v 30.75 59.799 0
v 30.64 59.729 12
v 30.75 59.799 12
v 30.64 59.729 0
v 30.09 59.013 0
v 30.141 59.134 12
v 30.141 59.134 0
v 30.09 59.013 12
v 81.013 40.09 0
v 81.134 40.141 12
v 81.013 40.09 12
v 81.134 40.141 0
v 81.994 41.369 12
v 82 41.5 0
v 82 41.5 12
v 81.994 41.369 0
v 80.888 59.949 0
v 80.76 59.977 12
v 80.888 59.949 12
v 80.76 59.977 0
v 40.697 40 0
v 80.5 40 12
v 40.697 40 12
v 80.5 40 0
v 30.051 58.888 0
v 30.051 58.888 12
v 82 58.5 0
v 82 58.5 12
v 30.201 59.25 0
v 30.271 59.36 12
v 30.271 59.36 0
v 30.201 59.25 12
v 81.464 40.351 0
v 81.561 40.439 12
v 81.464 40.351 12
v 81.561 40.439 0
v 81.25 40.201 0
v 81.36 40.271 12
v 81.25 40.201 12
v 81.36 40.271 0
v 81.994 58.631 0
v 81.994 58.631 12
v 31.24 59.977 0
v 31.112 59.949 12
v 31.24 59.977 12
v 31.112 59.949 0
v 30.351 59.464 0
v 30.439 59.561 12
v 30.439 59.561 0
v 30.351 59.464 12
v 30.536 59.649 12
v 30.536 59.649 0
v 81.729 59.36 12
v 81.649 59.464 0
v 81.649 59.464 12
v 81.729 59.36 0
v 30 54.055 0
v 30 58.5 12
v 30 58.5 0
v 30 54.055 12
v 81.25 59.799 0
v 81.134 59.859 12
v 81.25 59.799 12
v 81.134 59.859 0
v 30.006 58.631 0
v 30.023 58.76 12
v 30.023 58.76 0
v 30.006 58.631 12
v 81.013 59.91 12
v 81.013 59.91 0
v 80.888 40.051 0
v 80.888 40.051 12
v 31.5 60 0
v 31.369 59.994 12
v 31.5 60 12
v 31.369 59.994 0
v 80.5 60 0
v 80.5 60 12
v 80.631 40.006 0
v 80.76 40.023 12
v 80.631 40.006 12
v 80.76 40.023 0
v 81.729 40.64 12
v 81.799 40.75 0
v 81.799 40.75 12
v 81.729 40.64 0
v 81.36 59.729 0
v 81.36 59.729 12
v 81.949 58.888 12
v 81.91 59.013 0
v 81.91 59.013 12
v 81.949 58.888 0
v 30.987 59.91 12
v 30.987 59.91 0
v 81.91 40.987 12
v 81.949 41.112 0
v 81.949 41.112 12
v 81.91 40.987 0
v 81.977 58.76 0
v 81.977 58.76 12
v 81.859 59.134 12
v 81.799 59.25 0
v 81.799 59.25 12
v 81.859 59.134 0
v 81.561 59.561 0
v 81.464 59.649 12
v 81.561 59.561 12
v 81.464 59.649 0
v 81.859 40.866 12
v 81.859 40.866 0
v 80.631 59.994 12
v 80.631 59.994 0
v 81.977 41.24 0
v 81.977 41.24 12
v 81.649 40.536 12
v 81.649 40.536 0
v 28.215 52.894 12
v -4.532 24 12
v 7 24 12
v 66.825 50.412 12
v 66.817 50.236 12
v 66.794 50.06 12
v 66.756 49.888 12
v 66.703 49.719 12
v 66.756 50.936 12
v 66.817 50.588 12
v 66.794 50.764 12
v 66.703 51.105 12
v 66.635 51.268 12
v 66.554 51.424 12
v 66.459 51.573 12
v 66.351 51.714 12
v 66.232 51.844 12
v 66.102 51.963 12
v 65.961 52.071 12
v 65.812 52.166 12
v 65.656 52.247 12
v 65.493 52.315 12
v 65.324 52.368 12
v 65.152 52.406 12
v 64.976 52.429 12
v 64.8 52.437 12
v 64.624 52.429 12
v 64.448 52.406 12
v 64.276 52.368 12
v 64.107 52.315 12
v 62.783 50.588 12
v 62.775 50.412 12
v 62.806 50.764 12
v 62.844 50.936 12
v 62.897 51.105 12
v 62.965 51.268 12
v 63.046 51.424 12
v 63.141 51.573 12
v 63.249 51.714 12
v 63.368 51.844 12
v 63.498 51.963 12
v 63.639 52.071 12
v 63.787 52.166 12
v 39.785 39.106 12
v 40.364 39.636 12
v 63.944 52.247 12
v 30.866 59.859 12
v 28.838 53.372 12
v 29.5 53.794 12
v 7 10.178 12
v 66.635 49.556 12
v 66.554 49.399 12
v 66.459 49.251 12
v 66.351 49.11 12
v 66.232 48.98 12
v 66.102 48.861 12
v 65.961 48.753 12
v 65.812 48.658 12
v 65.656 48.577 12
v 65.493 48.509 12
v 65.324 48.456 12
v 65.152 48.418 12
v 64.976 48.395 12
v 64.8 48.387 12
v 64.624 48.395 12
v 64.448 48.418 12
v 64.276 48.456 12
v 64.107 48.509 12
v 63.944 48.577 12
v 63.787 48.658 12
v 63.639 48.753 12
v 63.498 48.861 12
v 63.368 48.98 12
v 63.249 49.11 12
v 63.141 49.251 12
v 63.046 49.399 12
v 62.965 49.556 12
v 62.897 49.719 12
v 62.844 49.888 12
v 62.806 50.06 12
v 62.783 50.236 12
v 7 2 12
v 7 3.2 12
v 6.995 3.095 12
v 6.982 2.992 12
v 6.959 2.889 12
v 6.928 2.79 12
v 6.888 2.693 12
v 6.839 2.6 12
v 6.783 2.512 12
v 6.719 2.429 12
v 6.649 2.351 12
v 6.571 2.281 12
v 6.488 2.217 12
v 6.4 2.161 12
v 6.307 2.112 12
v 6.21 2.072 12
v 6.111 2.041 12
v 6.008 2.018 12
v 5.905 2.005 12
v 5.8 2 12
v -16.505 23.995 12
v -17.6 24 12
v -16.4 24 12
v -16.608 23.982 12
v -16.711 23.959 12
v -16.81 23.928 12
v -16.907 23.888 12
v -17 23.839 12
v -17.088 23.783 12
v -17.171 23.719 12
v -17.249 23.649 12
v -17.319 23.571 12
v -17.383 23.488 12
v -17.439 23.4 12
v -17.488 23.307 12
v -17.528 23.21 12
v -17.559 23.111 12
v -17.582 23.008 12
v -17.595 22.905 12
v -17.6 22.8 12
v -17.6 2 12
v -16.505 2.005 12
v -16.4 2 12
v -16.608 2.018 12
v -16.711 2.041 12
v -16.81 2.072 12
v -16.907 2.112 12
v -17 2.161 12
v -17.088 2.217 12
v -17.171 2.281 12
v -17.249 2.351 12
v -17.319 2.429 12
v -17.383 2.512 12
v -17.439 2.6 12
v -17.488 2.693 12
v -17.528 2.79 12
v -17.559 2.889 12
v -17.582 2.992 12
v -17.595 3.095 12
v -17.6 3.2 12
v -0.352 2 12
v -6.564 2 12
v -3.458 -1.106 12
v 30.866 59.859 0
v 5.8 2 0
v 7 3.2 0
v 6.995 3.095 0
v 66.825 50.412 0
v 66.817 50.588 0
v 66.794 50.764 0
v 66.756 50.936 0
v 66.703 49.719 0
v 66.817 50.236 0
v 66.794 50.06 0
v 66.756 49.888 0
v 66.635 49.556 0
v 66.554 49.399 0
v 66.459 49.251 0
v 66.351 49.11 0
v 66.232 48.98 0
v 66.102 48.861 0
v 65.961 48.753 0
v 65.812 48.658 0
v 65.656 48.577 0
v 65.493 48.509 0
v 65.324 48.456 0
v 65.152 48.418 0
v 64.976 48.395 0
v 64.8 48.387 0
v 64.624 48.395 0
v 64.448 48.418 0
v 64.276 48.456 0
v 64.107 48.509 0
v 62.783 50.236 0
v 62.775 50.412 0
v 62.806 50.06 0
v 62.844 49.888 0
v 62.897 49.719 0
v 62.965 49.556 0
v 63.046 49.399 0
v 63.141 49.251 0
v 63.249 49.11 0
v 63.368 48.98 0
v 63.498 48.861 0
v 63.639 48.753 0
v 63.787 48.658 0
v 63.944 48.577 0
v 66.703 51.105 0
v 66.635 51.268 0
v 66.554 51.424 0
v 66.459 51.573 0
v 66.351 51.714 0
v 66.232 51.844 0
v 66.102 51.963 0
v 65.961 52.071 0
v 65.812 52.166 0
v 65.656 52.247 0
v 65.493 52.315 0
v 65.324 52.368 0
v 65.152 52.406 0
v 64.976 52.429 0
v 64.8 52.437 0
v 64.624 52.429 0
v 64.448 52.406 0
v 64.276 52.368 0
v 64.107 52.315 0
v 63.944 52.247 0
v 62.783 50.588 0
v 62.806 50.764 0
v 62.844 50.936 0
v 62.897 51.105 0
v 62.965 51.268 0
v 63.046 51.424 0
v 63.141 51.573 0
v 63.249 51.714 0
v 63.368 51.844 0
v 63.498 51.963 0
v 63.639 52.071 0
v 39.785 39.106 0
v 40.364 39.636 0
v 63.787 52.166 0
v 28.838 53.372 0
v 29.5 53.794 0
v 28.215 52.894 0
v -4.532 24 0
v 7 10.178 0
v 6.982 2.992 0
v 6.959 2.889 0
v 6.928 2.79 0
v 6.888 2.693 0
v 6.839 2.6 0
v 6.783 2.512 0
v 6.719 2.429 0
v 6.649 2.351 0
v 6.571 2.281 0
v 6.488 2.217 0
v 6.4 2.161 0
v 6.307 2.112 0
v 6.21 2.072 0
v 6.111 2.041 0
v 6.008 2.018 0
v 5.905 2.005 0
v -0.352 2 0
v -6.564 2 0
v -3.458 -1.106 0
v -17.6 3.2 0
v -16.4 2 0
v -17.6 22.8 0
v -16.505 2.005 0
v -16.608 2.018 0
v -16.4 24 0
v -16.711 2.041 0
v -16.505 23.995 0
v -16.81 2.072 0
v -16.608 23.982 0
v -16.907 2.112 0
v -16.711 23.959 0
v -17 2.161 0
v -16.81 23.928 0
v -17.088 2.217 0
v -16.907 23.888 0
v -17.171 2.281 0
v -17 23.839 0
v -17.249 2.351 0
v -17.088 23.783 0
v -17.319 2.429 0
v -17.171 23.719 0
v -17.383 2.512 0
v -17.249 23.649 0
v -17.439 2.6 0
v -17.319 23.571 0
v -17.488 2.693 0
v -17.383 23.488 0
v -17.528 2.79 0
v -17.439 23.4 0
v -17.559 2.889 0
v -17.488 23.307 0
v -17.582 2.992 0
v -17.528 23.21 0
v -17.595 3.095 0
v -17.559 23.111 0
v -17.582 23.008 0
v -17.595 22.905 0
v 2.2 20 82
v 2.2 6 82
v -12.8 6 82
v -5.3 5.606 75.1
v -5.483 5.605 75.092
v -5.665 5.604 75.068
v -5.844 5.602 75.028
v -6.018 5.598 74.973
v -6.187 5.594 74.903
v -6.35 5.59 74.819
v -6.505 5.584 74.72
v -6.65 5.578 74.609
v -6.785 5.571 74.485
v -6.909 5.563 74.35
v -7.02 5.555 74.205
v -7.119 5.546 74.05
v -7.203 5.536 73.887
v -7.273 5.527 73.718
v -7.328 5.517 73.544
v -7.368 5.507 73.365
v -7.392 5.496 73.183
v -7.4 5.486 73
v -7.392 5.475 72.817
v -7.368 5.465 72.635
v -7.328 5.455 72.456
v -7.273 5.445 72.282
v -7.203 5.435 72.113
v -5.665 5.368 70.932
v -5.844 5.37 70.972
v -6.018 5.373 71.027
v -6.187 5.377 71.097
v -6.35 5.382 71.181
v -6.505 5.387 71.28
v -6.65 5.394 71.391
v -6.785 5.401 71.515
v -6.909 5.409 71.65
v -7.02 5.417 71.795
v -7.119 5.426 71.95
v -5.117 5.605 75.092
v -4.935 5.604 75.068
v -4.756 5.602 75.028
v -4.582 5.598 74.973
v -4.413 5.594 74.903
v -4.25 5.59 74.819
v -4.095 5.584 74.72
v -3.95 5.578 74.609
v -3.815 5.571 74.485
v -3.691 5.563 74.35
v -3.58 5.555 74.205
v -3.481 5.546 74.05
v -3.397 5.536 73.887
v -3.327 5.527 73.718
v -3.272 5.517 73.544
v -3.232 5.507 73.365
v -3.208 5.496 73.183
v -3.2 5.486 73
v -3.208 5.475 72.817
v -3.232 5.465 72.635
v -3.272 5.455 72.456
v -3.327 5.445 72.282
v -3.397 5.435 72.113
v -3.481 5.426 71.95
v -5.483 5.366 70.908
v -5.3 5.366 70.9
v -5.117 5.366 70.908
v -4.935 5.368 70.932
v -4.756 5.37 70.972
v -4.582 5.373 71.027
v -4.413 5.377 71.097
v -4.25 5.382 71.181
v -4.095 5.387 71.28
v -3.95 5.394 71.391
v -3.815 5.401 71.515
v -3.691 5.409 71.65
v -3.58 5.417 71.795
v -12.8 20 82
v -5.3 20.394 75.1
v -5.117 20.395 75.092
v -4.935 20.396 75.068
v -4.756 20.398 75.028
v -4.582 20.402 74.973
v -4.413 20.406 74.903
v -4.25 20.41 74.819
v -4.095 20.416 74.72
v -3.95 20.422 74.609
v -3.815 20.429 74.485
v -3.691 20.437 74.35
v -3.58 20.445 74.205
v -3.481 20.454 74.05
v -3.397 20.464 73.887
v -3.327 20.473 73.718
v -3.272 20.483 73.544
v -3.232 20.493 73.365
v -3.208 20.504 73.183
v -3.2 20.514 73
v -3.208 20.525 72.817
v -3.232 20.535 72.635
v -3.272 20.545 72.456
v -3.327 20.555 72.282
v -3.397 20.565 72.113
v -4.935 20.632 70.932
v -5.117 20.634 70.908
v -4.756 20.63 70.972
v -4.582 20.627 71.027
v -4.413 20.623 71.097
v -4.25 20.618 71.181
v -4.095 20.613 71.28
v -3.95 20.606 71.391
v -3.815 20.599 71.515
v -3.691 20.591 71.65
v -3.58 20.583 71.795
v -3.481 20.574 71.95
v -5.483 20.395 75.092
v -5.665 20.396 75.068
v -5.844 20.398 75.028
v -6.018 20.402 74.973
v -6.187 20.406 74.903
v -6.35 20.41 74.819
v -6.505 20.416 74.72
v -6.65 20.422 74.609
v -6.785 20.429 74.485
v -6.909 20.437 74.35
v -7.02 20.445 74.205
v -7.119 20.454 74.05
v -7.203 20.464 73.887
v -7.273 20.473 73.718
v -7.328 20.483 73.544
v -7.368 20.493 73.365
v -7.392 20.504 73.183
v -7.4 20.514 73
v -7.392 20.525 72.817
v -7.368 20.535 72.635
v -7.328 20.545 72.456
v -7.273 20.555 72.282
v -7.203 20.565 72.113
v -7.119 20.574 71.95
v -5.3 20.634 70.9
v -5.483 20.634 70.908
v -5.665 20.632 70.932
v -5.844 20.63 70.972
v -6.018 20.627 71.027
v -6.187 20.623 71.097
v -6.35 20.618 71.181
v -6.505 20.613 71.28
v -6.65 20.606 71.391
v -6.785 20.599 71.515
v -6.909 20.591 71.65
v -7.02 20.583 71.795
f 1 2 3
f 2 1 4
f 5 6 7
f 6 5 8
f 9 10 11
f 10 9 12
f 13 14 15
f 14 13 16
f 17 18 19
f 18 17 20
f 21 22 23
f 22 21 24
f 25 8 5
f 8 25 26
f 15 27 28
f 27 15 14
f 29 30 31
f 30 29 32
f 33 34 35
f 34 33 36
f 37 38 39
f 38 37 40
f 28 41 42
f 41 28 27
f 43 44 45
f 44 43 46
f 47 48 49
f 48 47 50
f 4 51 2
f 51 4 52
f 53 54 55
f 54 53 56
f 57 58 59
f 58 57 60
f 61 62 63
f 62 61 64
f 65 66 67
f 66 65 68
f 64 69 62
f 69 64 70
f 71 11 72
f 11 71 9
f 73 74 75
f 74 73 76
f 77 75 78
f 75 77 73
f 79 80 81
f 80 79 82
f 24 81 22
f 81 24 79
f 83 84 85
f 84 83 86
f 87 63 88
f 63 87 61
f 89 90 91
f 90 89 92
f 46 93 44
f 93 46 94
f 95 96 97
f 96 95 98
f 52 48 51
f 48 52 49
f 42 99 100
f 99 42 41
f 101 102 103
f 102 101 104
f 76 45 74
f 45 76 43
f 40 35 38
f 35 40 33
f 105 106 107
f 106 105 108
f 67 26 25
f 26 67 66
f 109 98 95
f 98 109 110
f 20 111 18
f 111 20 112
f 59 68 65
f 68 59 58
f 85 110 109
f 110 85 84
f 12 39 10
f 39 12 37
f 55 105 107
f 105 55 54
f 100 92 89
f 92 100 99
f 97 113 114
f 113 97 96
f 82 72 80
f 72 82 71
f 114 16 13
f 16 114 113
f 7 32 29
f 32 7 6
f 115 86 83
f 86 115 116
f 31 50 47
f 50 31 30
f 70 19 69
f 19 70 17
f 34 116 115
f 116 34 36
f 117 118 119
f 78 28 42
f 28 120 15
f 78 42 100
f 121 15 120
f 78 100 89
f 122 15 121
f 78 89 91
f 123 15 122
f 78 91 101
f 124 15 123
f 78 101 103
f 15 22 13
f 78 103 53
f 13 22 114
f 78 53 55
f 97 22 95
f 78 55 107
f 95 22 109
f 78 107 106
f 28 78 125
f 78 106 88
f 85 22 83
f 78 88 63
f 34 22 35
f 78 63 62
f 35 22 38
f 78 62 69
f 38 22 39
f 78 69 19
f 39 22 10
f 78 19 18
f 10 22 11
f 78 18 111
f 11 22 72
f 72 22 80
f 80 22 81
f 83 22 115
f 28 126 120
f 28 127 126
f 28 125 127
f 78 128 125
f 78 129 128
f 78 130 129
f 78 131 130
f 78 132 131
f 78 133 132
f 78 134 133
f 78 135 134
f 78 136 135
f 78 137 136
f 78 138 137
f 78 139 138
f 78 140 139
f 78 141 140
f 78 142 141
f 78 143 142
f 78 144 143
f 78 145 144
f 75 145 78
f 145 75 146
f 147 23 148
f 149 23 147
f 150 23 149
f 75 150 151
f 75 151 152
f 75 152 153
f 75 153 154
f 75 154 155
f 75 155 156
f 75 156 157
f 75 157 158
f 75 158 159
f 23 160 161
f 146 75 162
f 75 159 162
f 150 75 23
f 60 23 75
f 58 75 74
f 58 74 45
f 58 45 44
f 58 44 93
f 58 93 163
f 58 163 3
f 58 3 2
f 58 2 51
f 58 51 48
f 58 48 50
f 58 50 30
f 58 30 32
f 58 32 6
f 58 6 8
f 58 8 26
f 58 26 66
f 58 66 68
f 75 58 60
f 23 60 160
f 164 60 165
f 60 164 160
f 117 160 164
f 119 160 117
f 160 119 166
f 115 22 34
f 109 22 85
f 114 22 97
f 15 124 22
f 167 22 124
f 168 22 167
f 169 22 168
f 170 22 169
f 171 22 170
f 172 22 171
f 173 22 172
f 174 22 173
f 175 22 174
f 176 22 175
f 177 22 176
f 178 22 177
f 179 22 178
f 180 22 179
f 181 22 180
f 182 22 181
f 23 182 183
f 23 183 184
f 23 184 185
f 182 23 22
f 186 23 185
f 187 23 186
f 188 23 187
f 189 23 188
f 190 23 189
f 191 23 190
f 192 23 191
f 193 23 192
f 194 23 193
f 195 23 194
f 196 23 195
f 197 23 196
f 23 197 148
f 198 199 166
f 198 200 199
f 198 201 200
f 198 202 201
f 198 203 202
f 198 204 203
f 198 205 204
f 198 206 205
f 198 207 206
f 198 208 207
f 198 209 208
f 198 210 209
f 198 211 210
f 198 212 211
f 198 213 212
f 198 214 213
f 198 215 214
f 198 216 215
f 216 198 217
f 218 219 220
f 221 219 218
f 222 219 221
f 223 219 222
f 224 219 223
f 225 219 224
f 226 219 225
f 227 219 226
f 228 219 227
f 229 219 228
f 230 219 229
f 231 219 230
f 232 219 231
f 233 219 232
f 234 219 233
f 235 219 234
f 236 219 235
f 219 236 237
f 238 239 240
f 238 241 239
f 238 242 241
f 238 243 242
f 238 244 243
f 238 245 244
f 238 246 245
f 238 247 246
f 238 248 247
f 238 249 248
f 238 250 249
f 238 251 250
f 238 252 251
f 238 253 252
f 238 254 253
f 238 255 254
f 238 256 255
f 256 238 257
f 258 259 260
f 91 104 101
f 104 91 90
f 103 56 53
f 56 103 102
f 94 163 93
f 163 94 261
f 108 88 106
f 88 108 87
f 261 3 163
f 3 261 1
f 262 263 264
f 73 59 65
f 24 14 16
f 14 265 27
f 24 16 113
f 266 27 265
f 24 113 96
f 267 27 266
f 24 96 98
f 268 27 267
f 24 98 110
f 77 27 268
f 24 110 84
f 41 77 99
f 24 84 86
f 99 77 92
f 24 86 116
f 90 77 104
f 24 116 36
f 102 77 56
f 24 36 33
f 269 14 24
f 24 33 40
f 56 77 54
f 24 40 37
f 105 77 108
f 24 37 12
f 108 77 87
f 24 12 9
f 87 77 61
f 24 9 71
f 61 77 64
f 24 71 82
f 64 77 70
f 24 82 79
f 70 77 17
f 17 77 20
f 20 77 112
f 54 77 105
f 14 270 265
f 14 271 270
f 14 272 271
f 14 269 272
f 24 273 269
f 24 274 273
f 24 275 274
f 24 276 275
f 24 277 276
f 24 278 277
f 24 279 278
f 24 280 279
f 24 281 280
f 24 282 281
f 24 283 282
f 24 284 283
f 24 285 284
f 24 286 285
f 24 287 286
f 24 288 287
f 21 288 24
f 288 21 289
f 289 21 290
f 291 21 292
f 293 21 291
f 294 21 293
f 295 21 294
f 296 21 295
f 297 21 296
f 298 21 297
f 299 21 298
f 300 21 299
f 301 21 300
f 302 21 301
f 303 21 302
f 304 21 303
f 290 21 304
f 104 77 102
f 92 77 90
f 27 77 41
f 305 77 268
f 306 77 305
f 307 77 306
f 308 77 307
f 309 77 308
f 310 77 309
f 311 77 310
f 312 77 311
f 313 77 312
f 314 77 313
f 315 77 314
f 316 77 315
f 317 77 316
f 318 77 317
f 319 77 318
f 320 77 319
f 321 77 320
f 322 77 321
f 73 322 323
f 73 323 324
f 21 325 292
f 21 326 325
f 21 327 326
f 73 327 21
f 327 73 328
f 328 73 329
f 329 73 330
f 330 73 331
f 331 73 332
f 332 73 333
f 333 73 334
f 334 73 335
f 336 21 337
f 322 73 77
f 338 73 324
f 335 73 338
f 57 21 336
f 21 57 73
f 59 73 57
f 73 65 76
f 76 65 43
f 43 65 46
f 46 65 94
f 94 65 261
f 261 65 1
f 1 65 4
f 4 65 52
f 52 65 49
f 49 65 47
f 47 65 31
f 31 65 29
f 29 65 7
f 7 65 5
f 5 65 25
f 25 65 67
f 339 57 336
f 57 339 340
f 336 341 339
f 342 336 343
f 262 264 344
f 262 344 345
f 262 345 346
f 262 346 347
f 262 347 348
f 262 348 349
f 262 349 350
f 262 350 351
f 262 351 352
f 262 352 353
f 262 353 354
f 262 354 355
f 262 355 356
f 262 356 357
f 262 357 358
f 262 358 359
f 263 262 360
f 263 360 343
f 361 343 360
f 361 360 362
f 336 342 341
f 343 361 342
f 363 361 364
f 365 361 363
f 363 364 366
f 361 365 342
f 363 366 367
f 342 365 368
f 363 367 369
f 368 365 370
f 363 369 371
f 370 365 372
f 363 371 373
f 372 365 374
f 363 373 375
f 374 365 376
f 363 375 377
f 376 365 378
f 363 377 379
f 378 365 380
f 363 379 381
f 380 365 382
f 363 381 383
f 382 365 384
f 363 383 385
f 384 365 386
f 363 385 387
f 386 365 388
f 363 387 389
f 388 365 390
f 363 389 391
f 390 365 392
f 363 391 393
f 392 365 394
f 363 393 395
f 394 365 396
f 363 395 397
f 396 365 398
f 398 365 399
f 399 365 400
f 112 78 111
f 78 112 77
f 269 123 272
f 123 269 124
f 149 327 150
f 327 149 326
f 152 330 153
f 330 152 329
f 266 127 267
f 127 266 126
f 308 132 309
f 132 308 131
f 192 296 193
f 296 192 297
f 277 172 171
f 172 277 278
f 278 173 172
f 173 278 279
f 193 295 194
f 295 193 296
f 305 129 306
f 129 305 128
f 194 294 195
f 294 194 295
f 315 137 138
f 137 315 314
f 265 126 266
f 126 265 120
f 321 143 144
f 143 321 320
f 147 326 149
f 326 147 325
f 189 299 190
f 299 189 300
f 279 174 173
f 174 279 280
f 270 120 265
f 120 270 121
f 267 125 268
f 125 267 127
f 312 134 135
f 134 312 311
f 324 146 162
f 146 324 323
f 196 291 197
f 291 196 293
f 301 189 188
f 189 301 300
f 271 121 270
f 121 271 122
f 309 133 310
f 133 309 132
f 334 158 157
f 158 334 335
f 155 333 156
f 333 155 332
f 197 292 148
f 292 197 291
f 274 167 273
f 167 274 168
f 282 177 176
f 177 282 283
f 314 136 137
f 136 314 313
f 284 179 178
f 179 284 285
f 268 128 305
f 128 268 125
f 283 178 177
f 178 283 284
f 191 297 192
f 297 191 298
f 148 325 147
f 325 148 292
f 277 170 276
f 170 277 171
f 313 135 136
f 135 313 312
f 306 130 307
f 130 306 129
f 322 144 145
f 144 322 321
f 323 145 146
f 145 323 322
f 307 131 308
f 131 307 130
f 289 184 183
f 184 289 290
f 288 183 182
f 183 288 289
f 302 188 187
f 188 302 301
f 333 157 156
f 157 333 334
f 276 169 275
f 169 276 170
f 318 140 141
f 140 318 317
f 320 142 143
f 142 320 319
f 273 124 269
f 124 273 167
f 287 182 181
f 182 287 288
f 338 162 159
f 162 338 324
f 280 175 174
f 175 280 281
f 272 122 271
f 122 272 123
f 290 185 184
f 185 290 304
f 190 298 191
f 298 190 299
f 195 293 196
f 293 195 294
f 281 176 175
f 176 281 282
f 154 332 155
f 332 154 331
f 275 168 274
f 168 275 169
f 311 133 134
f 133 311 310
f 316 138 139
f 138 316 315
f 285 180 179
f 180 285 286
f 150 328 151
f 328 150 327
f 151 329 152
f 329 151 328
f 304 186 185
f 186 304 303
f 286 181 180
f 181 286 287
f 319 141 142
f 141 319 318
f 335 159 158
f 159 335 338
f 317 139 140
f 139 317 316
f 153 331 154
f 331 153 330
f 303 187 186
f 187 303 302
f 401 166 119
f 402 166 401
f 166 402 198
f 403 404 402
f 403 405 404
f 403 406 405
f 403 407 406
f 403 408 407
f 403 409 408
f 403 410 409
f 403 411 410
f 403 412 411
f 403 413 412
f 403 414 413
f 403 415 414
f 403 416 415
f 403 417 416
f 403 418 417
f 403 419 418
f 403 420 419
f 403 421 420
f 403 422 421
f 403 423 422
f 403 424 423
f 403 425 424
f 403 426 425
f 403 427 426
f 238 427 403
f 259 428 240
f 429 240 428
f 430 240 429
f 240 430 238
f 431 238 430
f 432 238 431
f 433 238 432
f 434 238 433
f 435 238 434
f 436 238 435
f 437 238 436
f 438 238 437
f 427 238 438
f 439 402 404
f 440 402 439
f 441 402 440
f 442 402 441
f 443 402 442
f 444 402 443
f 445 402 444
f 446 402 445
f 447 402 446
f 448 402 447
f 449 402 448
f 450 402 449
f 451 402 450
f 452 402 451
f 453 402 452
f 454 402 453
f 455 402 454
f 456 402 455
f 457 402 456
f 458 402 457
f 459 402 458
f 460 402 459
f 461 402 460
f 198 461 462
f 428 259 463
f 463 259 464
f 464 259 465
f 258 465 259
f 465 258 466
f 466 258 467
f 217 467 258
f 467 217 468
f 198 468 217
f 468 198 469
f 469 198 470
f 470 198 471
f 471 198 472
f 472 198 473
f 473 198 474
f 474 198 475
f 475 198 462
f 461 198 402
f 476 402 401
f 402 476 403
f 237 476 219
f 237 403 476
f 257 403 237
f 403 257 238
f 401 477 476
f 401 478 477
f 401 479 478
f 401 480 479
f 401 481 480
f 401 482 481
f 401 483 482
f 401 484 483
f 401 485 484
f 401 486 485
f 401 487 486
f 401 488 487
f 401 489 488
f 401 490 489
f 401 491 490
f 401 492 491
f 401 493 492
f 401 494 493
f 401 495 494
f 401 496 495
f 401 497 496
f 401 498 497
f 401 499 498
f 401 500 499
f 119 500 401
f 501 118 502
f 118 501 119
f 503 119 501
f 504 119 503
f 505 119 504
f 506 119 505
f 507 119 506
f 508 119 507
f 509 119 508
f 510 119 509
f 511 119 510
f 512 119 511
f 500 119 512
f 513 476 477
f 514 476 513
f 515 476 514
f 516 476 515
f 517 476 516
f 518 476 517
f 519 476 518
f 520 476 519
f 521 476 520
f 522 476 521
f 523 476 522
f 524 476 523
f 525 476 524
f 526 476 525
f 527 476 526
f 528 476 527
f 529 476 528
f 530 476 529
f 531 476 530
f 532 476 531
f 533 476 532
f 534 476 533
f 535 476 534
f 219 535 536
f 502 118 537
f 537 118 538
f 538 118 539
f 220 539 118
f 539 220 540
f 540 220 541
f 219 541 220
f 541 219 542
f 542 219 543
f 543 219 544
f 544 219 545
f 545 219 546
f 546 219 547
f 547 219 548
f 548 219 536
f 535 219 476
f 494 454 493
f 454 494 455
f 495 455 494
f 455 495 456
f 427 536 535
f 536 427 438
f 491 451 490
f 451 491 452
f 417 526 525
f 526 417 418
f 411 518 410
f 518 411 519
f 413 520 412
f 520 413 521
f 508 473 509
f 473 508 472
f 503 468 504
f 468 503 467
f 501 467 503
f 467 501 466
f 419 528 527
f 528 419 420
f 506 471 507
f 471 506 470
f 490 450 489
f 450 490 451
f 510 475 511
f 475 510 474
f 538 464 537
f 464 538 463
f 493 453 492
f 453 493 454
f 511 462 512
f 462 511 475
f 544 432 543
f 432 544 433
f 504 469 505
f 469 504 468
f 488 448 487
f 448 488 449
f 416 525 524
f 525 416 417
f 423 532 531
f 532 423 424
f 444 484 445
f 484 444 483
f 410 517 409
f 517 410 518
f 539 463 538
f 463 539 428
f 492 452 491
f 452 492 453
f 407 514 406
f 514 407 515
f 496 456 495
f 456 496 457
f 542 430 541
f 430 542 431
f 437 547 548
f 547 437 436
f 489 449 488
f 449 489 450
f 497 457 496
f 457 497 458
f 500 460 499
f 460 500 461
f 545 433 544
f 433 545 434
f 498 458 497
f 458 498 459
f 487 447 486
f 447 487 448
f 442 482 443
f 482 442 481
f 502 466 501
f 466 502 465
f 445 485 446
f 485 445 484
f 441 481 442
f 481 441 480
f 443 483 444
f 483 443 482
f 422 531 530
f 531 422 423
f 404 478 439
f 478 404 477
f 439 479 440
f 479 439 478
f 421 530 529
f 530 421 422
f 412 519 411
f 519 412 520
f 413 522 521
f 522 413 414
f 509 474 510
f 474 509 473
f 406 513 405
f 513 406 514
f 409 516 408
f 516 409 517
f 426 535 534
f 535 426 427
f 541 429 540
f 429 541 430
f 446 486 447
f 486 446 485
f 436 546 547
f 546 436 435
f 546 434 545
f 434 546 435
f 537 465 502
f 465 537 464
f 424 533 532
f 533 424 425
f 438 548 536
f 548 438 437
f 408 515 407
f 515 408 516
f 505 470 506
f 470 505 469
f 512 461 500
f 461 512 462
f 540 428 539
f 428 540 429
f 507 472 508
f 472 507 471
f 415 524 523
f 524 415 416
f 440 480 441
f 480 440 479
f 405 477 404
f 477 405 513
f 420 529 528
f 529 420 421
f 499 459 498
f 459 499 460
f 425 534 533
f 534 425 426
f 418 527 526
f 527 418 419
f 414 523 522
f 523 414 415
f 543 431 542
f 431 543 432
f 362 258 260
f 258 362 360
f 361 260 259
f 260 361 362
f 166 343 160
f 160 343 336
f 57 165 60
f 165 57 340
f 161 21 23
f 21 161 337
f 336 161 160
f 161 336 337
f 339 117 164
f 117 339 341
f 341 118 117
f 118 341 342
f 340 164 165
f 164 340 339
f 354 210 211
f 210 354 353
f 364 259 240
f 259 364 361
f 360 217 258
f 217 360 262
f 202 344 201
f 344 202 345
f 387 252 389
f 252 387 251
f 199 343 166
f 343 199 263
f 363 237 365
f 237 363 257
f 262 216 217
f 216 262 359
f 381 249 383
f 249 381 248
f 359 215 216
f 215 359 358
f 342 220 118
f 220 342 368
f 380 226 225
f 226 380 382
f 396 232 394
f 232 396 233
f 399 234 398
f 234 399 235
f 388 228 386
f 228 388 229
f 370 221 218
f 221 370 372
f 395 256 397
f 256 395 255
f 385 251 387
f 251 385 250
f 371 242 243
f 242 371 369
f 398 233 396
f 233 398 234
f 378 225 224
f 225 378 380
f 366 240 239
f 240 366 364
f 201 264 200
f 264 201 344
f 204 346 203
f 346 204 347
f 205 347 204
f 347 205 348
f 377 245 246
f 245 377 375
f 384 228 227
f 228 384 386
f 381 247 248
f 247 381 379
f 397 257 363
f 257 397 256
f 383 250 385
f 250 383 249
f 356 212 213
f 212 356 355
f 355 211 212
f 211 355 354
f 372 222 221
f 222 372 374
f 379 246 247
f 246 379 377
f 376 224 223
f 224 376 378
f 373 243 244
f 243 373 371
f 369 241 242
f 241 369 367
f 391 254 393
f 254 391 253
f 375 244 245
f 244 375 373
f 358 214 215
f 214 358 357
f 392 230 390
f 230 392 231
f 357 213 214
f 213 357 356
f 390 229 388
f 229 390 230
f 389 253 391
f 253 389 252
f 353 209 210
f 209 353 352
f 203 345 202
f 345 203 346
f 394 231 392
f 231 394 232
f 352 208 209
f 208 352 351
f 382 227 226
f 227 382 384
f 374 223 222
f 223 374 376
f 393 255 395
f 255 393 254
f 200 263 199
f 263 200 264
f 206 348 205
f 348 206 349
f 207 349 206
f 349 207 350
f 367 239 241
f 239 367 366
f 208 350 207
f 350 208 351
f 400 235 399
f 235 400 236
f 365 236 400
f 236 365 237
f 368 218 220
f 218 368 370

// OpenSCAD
// Support_Cam_PI_IR_Cut_CR6_v5.scad
// Left CR-6 Pi IR-cut camera support bracket, rebuilt parametrically.
//
// This attempt intentionally focuses on the LEFT bracket only.  It does not
// import the STL.  v5 refines the lower printer foot and camera mounting hole
// from measured source-STL vertices while keeping the model parametric.

/* [Left Bracket Dimensions] */
base_z = 0;
base_thickness = 12;
diagonal_arm_width = 18;
diagonal_arm_start = [0, 16];
diagonal_arm_end = [34, 46];
camera_tab_origin = [30, 40, 0];
camera_tab_size = [52, 20, 12];
camera_hole_xy = [64.8, 50.412];
camera_hole_diameter = 4.05;
lower_foot_points = [[-8.407, 22.229], [-17.6, 13.036], [-3.458, -1.106], [5.735, 8.086]];

/* [Tower] */
tower_origin = [-17.6, 2, 12];
tower_bottom_size = [24.6, 22];
tower_top_size = [15, 14];
tower_height = 70;
tower_hole_y = 13;
tower_hole_z = 73;
tower_hole_diameter = 4.2;

/* [Preview] */
preview_color = true;
$fn = 72;

module maybe_color() {
    if (preview_color) color("palegreen") children();
    else children();
}

module bar_between(a, b, width, height) {
    hull() {
        translate([a[0], a[1], base_z]) cylinder(h = height, d = width);
        translate([b[0], b[1], base_z]) cylinder(h = height, d = width);
    }
}

module rounded_rect(size, radius = 1.5) {
    hull() {
        for (x = [radius, size[0] - radius])
            for (y = [radius, size[1] - radius])
                translate([x, y, 0]) cylinder(h = size[2], r = radius);
    }
}

module tapered_tower(origin, bottom_size, top_size, height) {
    bx = bottom_size[0];
    by = bottom_size[1];
    tx = top_size[0];
    ty = top_size[1];
    ox = (bx - tx) / 2;
    oy = (by - ty) / 2;

    translate(origin)
        polyhedron(
            points = [
                [0, 0, 0], [bx, 0, 0], [bx, by, 0], [0, by, 0],
                [ox, oy, height], [ox + tx, oy, height], [ox + tx, oy + ty, height], [ox, oy + ty, height]
            ],
            faces = [
                [0, 1, 2, 3], [4, 7, 6, 5],
                [0, 4, 5, 1], [1, 5, 6, 2],
                [2, 6, 7, 3], [3, 7, 4, 0]
            ]
        );
}

module tower_with_hole() {
    difference() {
        tapered_tower(tower_origin, tower_bottom_size, tower_top_size, tower_height);
        translate([tower_origin[0] + tower_bottom_size[0] / 2, tower_hole_y, tower_hole_z])
            rotate([90, 0, 0])
                cylinder(h = tower_bottom_size[1] + 4, d = tower_hole_diameter, center = true);
    }
}

module camera_tab() {
    difference() {
        translate(camera_tab_origin) rounded_rect(camera_tab_size, 1.5);
        translate([camera_hole_xy[0], camera_hole_xy[1], camera_tab_origin[2] - 0.5])
            cylinder(h = camera_tab_size[2] + 1, d = camera_hole_diameter);
    }
}

module lower_foot() {
    translate([0, 0, base_z])
        linear_extrude(height = base_thickness)
            polygon(points = lower_foot_points);
}


module left_bracket() {
    maybe_color()
        union() {
            // Continuous lower assembly: measured lower foot, diagonal arm, camera tab, and tower pad overlap.
            lower_foot();
            bar_between(diagonal_arm_start, diagonal_arm_end, diagonal_arm_width, base_thickness);
            camera_tab();
            translate([tower_origin[0], tower_origin[1], base_z])
                rounded_rect([tower_bottom_size[0], tower_bottom_size[1], base_thickness], 1.2);

            // The measured left STL has a tall tapered upright directly on the tower pad.
            tower_with_hole();
        }
}

left_bracket();
